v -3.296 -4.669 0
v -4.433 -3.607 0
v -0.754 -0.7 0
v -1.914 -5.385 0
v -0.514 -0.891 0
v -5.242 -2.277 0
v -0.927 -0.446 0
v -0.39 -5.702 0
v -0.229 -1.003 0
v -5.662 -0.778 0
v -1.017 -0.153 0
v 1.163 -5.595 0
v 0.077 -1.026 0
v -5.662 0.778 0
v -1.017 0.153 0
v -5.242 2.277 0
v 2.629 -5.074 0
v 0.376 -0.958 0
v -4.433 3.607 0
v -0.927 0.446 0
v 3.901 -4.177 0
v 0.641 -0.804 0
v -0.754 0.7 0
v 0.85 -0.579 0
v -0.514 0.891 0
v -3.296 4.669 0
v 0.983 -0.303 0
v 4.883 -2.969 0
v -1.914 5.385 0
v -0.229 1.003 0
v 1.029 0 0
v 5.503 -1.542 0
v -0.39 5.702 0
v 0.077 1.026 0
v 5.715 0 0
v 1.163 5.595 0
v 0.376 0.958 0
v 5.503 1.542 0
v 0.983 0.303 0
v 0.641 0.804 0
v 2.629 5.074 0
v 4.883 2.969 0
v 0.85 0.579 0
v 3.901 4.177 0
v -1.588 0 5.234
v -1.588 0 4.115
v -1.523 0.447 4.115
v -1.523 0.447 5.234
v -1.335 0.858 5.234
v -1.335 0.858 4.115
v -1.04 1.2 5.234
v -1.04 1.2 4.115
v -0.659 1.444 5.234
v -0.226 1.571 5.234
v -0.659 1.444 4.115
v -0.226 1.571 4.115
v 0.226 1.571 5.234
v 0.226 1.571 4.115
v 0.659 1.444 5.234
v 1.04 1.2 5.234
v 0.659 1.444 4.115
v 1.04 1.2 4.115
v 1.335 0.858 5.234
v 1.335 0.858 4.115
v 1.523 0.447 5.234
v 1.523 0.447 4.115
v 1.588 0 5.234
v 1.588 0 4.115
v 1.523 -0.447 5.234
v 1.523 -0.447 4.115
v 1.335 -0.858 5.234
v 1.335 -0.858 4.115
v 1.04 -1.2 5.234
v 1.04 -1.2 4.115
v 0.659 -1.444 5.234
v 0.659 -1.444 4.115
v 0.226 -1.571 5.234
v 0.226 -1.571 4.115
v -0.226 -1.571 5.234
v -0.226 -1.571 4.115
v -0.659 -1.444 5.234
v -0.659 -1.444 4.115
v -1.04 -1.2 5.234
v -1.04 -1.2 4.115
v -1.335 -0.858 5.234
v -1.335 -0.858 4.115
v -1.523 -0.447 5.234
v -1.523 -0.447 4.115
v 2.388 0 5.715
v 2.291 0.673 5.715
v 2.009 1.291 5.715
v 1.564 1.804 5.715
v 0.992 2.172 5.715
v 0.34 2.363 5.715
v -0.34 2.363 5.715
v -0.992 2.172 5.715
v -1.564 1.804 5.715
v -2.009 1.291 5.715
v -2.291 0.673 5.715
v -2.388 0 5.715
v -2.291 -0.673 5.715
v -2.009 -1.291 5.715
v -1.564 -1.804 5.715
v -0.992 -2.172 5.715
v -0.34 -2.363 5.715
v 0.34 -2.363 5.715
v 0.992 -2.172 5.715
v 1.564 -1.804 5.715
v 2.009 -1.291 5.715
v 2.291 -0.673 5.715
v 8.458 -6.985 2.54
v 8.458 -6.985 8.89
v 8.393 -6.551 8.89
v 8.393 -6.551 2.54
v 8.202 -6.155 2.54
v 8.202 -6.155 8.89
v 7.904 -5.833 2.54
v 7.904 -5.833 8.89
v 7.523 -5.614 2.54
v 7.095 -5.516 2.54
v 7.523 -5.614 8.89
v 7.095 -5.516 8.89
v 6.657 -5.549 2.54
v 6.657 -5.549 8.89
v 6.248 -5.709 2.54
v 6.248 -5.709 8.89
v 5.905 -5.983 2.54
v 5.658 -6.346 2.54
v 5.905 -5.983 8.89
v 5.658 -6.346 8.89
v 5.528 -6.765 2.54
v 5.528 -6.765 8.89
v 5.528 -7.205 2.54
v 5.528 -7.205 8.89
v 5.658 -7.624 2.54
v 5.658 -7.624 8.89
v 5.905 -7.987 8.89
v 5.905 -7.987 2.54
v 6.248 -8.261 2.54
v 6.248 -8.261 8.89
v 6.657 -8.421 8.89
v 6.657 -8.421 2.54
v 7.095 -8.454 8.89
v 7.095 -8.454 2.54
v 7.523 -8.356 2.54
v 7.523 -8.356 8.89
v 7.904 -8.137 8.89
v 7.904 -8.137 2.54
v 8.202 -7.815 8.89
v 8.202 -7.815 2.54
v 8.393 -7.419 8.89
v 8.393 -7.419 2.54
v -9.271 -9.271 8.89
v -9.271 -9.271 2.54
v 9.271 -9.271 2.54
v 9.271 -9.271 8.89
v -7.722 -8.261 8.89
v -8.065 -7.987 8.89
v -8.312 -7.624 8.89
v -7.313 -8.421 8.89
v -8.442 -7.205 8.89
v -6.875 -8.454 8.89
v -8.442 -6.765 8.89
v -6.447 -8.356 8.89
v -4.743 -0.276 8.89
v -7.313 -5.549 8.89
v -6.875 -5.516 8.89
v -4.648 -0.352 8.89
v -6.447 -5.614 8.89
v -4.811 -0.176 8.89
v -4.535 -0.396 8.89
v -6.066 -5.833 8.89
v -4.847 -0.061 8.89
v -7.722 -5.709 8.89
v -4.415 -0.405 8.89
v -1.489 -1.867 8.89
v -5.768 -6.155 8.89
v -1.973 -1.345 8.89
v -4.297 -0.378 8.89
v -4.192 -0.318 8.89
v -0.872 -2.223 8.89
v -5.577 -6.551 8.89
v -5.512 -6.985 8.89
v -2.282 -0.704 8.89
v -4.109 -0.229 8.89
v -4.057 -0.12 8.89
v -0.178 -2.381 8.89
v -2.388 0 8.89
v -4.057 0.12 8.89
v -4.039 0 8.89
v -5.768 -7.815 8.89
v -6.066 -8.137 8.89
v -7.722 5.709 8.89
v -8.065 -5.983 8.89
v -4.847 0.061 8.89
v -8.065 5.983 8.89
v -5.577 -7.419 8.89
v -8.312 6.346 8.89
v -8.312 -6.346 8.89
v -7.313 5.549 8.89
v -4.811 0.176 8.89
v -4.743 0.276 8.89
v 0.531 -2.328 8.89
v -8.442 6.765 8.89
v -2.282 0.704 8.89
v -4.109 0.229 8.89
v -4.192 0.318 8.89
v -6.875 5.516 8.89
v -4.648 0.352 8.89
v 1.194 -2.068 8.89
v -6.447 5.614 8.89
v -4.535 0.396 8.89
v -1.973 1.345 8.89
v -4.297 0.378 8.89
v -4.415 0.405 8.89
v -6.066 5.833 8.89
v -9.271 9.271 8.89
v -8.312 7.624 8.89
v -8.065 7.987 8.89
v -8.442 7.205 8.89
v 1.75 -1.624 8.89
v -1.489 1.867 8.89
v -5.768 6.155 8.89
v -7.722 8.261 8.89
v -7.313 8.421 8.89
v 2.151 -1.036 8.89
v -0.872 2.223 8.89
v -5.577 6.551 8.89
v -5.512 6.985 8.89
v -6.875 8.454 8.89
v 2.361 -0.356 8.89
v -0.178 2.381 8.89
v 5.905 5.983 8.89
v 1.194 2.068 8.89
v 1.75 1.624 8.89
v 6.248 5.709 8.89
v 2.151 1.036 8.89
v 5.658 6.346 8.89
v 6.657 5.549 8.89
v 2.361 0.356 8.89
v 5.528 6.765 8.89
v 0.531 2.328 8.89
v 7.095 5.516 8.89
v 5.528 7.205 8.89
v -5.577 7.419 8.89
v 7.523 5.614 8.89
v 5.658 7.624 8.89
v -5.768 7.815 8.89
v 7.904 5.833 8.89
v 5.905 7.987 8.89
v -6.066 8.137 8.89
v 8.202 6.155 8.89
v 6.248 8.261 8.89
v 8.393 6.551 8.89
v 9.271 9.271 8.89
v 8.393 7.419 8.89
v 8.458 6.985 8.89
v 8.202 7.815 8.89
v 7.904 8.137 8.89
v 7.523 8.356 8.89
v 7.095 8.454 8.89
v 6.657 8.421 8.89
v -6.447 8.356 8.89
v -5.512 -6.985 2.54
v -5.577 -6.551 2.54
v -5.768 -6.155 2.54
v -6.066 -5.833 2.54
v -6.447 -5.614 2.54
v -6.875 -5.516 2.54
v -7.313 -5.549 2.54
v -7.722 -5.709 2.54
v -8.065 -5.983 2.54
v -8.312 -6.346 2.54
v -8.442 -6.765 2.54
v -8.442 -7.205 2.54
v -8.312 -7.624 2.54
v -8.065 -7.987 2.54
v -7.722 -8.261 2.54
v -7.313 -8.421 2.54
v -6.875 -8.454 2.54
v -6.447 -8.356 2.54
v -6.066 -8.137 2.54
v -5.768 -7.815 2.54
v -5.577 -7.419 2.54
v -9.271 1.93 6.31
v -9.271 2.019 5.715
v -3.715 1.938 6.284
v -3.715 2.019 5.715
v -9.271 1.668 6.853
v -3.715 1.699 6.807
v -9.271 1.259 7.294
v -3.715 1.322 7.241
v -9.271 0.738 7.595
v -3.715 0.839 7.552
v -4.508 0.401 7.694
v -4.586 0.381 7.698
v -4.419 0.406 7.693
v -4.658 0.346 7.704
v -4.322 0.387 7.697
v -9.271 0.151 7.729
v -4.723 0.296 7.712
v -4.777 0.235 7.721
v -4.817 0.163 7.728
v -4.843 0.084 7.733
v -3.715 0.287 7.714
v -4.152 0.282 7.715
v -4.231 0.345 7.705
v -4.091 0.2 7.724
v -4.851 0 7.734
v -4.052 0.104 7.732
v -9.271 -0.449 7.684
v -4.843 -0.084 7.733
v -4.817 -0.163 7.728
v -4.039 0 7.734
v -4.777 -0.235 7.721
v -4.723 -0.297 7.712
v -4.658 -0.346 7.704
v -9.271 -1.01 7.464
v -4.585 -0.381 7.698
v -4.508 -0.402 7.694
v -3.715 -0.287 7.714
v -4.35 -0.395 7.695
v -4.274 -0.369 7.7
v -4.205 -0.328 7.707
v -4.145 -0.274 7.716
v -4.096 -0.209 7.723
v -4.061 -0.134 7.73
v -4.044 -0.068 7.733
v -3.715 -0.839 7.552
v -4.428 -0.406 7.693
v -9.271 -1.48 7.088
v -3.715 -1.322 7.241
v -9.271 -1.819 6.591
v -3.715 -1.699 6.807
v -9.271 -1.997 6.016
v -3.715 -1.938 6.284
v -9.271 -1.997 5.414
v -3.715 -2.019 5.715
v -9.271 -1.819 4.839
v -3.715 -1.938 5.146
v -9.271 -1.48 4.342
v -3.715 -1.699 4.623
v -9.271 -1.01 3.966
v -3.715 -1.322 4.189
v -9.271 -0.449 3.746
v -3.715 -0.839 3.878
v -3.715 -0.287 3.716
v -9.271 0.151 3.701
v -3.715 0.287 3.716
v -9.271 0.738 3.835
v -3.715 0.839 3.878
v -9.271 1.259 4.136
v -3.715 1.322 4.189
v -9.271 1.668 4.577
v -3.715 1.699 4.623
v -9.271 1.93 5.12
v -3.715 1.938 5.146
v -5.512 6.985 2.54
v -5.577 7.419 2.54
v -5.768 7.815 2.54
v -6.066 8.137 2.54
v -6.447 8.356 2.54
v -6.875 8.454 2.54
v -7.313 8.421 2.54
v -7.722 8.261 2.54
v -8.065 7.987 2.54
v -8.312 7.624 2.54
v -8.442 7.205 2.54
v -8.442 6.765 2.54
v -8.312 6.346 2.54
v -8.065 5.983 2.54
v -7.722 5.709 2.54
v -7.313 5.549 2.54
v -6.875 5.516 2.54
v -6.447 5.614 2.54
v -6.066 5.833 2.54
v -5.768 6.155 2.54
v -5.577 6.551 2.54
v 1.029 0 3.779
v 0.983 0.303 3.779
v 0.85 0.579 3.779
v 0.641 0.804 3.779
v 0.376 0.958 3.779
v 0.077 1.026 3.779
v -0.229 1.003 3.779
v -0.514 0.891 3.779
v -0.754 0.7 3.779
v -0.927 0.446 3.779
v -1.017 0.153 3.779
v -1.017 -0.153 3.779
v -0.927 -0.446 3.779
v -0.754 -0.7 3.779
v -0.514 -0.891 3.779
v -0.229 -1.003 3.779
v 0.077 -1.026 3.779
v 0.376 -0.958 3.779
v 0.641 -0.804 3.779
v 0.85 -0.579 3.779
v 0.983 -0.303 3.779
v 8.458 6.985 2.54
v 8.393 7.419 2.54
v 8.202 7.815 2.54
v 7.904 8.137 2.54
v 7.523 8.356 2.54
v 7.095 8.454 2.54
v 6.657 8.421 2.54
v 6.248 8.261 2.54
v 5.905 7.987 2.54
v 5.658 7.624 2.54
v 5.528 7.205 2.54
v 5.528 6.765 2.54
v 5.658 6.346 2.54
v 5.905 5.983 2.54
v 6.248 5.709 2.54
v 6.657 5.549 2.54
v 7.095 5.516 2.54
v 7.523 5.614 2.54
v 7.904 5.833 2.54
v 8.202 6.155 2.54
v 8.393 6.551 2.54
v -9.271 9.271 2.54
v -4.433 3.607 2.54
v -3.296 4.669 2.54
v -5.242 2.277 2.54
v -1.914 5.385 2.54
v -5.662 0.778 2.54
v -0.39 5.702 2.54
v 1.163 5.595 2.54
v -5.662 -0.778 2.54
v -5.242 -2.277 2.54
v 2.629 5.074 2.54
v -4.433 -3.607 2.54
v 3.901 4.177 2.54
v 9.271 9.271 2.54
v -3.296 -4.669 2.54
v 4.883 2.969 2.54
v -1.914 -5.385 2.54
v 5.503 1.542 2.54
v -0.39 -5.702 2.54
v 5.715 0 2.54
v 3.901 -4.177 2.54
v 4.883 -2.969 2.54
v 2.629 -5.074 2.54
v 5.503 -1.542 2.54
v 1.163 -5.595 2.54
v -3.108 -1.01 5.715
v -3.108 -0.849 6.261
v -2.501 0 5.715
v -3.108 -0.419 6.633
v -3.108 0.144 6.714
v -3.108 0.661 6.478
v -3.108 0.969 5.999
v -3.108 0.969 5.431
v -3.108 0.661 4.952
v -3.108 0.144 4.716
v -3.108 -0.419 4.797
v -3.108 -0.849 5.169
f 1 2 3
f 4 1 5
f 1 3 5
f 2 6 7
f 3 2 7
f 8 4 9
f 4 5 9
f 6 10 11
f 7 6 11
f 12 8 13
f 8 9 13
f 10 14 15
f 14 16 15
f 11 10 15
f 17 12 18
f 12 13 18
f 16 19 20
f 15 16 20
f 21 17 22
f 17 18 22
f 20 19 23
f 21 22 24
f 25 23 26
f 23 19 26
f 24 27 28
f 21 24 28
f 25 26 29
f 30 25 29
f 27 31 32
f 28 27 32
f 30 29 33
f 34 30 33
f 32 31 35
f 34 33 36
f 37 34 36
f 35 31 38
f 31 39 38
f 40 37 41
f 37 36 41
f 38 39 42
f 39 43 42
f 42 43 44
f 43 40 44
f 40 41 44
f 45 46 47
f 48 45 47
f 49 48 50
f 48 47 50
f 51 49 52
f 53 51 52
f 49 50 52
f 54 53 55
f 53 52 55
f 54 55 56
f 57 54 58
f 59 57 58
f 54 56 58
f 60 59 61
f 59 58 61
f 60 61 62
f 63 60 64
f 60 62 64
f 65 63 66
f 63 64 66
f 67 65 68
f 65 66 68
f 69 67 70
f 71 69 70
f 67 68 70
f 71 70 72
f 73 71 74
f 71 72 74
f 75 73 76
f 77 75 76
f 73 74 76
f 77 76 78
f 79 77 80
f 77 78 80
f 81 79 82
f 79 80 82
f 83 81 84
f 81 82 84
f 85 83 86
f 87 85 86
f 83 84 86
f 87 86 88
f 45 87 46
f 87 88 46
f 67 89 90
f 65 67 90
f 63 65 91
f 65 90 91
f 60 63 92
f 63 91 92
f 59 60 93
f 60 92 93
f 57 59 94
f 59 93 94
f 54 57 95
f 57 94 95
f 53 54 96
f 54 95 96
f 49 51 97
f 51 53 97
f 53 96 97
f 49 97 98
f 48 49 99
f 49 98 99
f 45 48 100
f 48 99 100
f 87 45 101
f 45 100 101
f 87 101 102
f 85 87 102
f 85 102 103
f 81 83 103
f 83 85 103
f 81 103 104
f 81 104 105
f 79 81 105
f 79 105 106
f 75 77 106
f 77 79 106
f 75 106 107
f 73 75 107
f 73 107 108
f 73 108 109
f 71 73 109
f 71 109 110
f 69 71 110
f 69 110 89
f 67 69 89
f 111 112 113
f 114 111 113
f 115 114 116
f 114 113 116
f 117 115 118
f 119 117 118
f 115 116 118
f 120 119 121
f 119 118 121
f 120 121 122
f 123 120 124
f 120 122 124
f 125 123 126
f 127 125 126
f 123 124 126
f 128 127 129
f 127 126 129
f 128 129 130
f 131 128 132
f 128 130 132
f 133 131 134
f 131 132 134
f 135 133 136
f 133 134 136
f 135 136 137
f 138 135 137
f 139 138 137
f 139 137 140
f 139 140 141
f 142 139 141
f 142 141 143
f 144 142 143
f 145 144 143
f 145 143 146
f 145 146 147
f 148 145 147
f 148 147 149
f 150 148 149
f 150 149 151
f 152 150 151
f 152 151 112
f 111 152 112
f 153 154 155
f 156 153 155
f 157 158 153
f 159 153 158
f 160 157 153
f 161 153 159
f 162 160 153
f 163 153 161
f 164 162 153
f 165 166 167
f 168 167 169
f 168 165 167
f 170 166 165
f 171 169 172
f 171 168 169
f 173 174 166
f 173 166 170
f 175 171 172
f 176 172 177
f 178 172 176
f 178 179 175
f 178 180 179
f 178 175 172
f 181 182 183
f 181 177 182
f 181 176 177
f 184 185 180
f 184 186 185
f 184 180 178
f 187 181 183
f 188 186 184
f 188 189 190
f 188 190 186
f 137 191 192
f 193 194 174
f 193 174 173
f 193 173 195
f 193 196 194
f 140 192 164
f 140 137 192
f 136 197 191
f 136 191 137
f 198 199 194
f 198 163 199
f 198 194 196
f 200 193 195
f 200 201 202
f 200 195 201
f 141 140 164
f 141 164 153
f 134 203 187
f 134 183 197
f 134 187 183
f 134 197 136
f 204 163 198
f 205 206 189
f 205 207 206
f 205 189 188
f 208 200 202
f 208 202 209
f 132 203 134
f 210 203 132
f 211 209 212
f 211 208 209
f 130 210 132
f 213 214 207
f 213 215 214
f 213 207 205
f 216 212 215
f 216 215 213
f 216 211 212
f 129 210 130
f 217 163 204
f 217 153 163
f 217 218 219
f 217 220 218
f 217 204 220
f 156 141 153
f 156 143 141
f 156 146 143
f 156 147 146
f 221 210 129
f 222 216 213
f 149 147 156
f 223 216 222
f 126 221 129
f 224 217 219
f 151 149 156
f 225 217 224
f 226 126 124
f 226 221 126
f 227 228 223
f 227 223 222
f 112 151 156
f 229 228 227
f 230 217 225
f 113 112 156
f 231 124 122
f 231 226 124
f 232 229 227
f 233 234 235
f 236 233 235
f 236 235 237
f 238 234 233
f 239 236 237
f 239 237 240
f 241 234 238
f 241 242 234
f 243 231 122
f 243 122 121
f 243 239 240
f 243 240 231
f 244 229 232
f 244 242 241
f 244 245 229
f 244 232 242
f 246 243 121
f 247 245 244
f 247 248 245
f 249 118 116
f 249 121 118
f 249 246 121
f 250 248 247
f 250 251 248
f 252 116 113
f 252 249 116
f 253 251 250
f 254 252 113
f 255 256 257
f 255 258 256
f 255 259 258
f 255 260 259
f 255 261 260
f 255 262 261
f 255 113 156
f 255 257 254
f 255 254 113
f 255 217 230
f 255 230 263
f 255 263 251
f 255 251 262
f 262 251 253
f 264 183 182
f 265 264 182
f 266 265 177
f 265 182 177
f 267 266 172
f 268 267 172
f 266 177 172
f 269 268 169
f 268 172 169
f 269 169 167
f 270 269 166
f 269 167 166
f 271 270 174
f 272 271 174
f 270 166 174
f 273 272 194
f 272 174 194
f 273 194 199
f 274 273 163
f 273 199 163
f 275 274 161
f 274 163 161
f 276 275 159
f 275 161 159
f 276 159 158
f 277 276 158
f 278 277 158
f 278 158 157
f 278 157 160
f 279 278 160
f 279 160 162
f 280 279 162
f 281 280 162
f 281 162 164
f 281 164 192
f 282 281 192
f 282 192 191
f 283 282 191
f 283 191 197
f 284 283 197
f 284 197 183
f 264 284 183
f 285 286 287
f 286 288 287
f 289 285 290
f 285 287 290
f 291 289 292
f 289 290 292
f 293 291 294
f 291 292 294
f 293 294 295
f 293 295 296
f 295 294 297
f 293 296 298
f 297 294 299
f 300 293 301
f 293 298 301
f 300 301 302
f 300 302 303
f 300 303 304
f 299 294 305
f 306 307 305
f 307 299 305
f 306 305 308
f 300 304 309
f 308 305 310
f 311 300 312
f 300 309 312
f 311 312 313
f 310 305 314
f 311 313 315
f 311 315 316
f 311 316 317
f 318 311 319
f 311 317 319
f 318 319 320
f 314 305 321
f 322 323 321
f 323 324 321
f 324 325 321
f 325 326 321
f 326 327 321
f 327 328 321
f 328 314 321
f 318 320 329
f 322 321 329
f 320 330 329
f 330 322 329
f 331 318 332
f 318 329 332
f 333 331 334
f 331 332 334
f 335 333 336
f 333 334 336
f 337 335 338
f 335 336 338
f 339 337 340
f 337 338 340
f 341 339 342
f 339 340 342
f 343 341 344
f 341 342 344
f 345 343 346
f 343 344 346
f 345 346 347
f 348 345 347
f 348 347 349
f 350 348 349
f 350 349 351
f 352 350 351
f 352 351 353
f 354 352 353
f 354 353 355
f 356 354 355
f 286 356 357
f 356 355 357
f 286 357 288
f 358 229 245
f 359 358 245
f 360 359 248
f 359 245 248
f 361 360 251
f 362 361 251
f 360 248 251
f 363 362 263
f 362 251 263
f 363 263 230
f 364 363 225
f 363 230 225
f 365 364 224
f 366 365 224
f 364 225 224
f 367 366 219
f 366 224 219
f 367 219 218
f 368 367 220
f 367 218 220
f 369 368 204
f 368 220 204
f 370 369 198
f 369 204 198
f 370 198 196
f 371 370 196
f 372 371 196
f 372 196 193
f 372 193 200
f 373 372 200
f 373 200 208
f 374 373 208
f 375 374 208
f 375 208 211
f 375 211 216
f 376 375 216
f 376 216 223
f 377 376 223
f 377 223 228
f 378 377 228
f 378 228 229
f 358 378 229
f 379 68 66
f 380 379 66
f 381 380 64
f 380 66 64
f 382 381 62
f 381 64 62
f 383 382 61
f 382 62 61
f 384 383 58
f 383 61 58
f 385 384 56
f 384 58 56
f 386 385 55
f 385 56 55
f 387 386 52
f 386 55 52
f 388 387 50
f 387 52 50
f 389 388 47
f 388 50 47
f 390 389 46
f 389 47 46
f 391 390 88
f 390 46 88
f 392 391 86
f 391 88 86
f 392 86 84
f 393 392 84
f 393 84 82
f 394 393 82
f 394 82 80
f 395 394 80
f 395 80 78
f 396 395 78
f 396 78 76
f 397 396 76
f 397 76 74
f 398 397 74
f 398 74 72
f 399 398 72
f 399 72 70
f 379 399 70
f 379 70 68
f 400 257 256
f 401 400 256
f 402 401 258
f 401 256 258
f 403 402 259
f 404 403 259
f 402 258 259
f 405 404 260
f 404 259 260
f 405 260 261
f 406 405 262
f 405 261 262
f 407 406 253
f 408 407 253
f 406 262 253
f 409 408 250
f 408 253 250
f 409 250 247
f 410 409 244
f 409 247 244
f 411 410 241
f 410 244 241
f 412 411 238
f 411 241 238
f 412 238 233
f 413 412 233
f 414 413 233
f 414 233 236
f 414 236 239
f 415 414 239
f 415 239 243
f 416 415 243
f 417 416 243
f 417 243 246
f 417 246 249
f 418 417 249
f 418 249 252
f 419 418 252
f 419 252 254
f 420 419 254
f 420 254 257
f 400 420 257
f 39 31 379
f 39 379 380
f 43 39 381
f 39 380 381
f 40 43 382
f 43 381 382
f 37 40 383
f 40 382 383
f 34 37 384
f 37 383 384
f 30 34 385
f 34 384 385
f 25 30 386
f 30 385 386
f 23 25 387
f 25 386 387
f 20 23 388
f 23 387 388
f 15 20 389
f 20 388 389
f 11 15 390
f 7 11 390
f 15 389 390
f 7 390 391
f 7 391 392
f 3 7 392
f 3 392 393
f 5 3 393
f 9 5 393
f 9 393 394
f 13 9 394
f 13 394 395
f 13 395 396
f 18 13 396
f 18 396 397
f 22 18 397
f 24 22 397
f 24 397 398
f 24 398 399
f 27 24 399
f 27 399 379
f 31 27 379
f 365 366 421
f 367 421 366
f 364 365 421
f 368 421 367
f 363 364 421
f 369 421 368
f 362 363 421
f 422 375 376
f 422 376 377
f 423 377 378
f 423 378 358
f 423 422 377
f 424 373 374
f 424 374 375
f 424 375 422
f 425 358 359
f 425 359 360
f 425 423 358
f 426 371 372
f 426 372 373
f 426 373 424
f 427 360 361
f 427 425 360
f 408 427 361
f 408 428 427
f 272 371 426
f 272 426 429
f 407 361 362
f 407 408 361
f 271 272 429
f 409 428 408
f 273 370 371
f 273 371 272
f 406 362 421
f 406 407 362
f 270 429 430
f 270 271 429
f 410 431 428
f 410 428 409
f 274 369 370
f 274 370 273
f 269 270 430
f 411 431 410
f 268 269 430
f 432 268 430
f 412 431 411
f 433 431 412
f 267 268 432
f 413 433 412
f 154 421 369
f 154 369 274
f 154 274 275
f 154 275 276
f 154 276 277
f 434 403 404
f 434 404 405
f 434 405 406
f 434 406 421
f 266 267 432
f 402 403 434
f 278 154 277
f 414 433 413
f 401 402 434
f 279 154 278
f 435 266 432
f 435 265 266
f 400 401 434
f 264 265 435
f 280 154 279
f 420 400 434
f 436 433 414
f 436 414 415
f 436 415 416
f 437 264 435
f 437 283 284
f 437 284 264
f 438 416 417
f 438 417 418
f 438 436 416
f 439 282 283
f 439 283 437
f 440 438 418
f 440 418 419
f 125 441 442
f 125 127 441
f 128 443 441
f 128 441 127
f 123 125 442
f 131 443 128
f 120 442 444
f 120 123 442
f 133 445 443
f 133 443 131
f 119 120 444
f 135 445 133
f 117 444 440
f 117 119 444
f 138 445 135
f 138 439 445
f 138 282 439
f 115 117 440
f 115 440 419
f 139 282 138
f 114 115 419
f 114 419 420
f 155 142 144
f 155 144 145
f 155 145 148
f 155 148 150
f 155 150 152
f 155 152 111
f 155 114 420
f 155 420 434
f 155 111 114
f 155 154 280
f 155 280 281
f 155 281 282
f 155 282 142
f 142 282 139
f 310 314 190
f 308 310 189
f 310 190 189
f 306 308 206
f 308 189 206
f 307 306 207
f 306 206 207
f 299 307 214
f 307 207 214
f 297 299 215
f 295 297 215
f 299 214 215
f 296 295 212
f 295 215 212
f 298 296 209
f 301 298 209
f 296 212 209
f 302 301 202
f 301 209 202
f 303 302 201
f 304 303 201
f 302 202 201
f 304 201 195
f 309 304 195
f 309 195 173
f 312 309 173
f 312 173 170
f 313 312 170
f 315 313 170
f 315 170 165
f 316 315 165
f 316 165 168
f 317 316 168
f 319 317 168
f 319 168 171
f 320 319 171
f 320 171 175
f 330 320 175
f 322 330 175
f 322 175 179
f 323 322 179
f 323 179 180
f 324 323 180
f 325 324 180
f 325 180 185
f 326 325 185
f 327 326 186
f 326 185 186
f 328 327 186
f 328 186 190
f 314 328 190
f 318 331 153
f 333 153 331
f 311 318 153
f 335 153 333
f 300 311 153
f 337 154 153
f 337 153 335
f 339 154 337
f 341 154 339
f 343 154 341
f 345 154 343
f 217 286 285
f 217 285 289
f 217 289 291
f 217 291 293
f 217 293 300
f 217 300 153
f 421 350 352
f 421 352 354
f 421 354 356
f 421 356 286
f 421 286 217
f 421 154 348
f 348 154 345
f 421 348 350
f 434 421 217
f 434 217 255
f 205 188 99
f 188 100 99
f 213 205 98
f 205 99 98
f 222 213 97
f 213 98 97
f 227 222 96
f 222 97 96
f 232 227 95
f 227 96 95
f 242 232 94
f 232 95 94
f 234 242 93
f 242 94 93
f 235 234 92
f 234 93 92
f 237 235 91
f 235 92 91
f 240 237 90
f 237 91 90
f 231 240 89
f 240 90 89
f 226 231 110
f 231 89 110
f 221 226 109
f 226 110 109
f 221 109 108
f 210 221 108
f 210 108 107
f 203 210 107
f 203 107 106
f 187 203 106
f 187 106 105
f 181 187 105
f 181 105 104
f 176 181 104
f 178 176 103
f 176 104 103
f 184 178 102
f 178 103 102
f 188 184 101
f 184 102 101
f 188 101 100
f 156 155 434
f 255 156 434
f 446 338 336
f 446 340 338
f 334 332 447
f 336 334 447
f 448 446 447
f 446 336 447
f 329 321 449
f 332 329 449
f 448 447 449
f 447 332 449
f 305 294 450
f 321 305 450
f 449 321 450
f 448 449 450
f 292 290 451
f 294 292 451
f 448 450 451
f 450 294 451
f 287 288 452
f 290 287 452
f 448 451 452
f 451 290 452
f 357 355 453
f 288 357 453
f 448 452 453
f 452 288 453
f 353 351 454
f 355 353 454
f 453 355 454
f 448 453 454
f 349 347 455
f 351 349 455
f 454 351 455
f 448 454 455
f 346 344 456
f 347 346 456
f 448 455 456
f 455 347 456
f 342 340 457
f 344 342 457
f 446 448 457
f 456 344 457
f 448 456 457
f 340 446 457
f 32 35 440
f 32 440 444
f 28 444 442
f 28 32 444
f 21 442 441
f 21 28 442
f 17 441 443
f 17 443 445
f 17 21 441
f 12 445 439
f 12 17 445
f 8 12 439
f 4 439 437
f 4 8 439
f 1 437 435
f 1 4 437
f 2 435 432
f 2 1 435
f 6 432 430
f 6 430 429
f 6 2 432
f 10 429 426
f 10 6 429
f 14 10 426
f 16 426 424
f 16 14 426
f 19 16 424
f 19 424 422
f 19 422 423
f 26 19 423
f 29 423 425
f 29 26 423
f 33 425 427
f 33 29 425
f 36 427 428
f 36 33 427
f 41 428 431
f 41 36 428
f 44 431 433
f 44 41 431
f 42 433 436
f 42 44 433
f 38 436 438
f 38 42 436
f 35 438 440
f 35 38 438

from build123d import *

# Parameters (mm, degrees)
F0_W      = 18.542
F0_H      = 18.542
F1_DEPTH  = 8.89
F2_R      = 1.0287
F3_DEPTH  = 8.891
F5_D      = 3.175
F5_DEPTH  = 4.7752
F5_TIP    = 0.9538662327
F7_D      = 4.7752
F7_DEPTH  = 3.175
F7_TIP    = 1.434614814
F8_R      = 0.4064
F9_DEPTH  = 3.175
F10_R     = 1.4732
F11_DEPTH = 8.891
F12_W     = 18.542
F12_H     = 18.542
F12_R     = 5.715
F13_DEPTH = 2.54
F15_D     = 4.0386
F15_DEPTH = 5.55625
F15_TIP   = 1.213317848


with BuildPart() as f1:
    # F0 (on Top) → F1 (new body)
    with BuildSketch(Plane.XY):
        Rectangle(F0_W, F0_H)
    extrude(amount=F1_DEPTH)

    # F2 (on face) → F3 (cut, through all)
    with BuildSketch(Plane.XY.offset(8.89)):
        Circle(F2_R)
    extrude(amount=-F3_DEPTH, mode=Mode.SUBTRACT)

    # F5
    with Locations(Plane.XY.offset(8.89)):
        with Locations((0, 0)):
            Hole(F5_D / 2, depth=F5_DEPTH)
            with Locations((0, 0, -(F5_DEPTH + F5_TIP / 2))):  # 118° drill point
                Cone(0, F5_D / 2, F5_TIP, mode=Mode.SUBTRACT)

    # F7
    with Locations(Plane.XY.offset(8.89)):
        with Locations((0, 0)):
            Hole(F7_D / 2, depth=F7_DEPTH)
            with Locations((0, 0, -(F7_DEPTH + F7_TIP / 2))):  # 118° drill point
                Cone(0, F7_D / 2, F7_TIP, mode=Mode.SUBTRACT)

    # F8 (on face) → F9 (cut)
    with BuildSketch(Plane.XY.offset(8.89)):
        with Locations((-4.445, 0)):
            Circle(F8_R)
    extrude(amount=-F9_DEPTH, mode=Mode.SUBTRACT)

    # F10 (on face) → F11 (cut, through all)
    with BuildSketch(Plane.XY.offset(8.89)):
        with Locations((-6.985, 6.985)):
            Circle(F10_R)
        with Locations((-6.985, -6.985)):
            Circle(F10_R)
        with Locations((6.985, 6.985)):
            Circle(F10_R)
        with Locations((6.985, -6.985)):
            Circle(F10_R)
    extrude(amount=-F11_DEPTH, mode=Mode.SUBTRACT)

    # F12 (on face) → F13 (cut)
    with BuildSketch(Plane(origin=(0, 0, 0), x_dir=(1, 0, 0), z_dir=(0, 0, -1))):
        Rectangle(F12_W, F12_H)
        Circle(F12_R, mode=Mode.SUBTRACT)
    extrude(amount=-F13_DEPTH, mode=Mode.SUBTRACT)

    # F15
    with Locations(Plane(origin=(-9.271, 0, 0), x_dir=(0, -1, 0), z_dir=(-1, 0, 0))):
        with Locations((0, 5.715)):
            Hole(F15_D / 2, depth=F15_DEPTH)
            with Locations((0, 0, -(F15_DEPTH + F15_TIP / 2))):  # 118° drill point
                Cone(0, F15_D / 2, F15_TIP, mode=Mode.SUBTRACT)


solid = f1.part
